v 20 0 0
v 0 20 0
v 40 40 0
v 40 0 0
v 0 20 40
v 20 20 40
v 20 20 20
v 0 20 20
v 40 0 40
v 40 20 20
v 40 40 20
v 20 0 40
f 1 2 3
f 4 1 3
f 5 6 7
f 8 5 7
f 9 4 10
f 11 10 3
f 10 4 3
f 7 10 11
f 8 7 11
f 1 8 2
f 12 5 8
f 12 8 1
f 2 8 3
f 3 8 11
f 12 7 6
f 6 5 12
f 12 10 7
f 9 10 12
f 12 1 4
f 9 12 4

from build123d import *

# Parameters (mm, degrees)
SKETCH1_W           = 40
SKETCH1_H           = 40
BOSS_EXTRUDE1_DEPTH = 40
CUT_EXTRUDE1_DEPTH  = 40
SKETCH3_W           = 20
SKETCH3_H           = 20
CUT_EXTRUDE2_DEPTH  = 40
CUT_EXTRUDE4_DEPTH  = 40
CUT_EXTRUDE5_DEPTH  = 20


with BuildPart() as part:
    # Sketch1 → Boss-Extrude1 (new body)
    with BuildSketch(Plane.XY):
        with Locations((20, 20)):
            Rectangle(SKETCH1_W, SKETCH1_H)
    extrude(amount=BOSS_EXTRUDE1_DEPTH)

    # Sketch2 → Cut-Extrude1 (cut)
    with BuildSketch(Plane.XY.offset(40)):
        Polygon((40, 40), (0, 40), (0, 20), align=None)
    extrude(amount=-CUT_EXTRUDE1_DEPTH, mode=Mode.SUBTRACT)

    # Sketch3 → Cut-Extrude2 (cut)
    with BuildSketch(Plane(origin=(40, 0, 0), x_dir=(0, 0, -1), z_dir=(1, 0, 0))):
        with Locations((-30, 30)):
            Rectangle(SKETCH3_W, SKETCH3_H)
    extrude(amount=-CUT_EXTRUDE2_DEPTH, mode=Mode.SUBTRACT)

    # Sketch4 → Cut-Extrude4 (cut)
    with BuildSketch(Plane.XY.offset(40)):
        Polygon((0, 20), (20, 0), (0, 0), align=None)
    extrude(amount=-CUT_EXTRUDE4_DEPTH, mode=Mode.SUBTRACT)

    # Sketch5 → Cut-Extrude5 (cut)
    with BuildSketch(Plane(origin=(40, 0, 0), x_dir=(0, 0, -1), z_dir=(1, 0, 0))):
        Polygon((-20, 20), (-40, 0), (-40, 20), align=None)
    extrude(amount=-CUT_EXTRUDE5_DEPTH, mode=Mode.SUBTRACT)


solid = part.part
